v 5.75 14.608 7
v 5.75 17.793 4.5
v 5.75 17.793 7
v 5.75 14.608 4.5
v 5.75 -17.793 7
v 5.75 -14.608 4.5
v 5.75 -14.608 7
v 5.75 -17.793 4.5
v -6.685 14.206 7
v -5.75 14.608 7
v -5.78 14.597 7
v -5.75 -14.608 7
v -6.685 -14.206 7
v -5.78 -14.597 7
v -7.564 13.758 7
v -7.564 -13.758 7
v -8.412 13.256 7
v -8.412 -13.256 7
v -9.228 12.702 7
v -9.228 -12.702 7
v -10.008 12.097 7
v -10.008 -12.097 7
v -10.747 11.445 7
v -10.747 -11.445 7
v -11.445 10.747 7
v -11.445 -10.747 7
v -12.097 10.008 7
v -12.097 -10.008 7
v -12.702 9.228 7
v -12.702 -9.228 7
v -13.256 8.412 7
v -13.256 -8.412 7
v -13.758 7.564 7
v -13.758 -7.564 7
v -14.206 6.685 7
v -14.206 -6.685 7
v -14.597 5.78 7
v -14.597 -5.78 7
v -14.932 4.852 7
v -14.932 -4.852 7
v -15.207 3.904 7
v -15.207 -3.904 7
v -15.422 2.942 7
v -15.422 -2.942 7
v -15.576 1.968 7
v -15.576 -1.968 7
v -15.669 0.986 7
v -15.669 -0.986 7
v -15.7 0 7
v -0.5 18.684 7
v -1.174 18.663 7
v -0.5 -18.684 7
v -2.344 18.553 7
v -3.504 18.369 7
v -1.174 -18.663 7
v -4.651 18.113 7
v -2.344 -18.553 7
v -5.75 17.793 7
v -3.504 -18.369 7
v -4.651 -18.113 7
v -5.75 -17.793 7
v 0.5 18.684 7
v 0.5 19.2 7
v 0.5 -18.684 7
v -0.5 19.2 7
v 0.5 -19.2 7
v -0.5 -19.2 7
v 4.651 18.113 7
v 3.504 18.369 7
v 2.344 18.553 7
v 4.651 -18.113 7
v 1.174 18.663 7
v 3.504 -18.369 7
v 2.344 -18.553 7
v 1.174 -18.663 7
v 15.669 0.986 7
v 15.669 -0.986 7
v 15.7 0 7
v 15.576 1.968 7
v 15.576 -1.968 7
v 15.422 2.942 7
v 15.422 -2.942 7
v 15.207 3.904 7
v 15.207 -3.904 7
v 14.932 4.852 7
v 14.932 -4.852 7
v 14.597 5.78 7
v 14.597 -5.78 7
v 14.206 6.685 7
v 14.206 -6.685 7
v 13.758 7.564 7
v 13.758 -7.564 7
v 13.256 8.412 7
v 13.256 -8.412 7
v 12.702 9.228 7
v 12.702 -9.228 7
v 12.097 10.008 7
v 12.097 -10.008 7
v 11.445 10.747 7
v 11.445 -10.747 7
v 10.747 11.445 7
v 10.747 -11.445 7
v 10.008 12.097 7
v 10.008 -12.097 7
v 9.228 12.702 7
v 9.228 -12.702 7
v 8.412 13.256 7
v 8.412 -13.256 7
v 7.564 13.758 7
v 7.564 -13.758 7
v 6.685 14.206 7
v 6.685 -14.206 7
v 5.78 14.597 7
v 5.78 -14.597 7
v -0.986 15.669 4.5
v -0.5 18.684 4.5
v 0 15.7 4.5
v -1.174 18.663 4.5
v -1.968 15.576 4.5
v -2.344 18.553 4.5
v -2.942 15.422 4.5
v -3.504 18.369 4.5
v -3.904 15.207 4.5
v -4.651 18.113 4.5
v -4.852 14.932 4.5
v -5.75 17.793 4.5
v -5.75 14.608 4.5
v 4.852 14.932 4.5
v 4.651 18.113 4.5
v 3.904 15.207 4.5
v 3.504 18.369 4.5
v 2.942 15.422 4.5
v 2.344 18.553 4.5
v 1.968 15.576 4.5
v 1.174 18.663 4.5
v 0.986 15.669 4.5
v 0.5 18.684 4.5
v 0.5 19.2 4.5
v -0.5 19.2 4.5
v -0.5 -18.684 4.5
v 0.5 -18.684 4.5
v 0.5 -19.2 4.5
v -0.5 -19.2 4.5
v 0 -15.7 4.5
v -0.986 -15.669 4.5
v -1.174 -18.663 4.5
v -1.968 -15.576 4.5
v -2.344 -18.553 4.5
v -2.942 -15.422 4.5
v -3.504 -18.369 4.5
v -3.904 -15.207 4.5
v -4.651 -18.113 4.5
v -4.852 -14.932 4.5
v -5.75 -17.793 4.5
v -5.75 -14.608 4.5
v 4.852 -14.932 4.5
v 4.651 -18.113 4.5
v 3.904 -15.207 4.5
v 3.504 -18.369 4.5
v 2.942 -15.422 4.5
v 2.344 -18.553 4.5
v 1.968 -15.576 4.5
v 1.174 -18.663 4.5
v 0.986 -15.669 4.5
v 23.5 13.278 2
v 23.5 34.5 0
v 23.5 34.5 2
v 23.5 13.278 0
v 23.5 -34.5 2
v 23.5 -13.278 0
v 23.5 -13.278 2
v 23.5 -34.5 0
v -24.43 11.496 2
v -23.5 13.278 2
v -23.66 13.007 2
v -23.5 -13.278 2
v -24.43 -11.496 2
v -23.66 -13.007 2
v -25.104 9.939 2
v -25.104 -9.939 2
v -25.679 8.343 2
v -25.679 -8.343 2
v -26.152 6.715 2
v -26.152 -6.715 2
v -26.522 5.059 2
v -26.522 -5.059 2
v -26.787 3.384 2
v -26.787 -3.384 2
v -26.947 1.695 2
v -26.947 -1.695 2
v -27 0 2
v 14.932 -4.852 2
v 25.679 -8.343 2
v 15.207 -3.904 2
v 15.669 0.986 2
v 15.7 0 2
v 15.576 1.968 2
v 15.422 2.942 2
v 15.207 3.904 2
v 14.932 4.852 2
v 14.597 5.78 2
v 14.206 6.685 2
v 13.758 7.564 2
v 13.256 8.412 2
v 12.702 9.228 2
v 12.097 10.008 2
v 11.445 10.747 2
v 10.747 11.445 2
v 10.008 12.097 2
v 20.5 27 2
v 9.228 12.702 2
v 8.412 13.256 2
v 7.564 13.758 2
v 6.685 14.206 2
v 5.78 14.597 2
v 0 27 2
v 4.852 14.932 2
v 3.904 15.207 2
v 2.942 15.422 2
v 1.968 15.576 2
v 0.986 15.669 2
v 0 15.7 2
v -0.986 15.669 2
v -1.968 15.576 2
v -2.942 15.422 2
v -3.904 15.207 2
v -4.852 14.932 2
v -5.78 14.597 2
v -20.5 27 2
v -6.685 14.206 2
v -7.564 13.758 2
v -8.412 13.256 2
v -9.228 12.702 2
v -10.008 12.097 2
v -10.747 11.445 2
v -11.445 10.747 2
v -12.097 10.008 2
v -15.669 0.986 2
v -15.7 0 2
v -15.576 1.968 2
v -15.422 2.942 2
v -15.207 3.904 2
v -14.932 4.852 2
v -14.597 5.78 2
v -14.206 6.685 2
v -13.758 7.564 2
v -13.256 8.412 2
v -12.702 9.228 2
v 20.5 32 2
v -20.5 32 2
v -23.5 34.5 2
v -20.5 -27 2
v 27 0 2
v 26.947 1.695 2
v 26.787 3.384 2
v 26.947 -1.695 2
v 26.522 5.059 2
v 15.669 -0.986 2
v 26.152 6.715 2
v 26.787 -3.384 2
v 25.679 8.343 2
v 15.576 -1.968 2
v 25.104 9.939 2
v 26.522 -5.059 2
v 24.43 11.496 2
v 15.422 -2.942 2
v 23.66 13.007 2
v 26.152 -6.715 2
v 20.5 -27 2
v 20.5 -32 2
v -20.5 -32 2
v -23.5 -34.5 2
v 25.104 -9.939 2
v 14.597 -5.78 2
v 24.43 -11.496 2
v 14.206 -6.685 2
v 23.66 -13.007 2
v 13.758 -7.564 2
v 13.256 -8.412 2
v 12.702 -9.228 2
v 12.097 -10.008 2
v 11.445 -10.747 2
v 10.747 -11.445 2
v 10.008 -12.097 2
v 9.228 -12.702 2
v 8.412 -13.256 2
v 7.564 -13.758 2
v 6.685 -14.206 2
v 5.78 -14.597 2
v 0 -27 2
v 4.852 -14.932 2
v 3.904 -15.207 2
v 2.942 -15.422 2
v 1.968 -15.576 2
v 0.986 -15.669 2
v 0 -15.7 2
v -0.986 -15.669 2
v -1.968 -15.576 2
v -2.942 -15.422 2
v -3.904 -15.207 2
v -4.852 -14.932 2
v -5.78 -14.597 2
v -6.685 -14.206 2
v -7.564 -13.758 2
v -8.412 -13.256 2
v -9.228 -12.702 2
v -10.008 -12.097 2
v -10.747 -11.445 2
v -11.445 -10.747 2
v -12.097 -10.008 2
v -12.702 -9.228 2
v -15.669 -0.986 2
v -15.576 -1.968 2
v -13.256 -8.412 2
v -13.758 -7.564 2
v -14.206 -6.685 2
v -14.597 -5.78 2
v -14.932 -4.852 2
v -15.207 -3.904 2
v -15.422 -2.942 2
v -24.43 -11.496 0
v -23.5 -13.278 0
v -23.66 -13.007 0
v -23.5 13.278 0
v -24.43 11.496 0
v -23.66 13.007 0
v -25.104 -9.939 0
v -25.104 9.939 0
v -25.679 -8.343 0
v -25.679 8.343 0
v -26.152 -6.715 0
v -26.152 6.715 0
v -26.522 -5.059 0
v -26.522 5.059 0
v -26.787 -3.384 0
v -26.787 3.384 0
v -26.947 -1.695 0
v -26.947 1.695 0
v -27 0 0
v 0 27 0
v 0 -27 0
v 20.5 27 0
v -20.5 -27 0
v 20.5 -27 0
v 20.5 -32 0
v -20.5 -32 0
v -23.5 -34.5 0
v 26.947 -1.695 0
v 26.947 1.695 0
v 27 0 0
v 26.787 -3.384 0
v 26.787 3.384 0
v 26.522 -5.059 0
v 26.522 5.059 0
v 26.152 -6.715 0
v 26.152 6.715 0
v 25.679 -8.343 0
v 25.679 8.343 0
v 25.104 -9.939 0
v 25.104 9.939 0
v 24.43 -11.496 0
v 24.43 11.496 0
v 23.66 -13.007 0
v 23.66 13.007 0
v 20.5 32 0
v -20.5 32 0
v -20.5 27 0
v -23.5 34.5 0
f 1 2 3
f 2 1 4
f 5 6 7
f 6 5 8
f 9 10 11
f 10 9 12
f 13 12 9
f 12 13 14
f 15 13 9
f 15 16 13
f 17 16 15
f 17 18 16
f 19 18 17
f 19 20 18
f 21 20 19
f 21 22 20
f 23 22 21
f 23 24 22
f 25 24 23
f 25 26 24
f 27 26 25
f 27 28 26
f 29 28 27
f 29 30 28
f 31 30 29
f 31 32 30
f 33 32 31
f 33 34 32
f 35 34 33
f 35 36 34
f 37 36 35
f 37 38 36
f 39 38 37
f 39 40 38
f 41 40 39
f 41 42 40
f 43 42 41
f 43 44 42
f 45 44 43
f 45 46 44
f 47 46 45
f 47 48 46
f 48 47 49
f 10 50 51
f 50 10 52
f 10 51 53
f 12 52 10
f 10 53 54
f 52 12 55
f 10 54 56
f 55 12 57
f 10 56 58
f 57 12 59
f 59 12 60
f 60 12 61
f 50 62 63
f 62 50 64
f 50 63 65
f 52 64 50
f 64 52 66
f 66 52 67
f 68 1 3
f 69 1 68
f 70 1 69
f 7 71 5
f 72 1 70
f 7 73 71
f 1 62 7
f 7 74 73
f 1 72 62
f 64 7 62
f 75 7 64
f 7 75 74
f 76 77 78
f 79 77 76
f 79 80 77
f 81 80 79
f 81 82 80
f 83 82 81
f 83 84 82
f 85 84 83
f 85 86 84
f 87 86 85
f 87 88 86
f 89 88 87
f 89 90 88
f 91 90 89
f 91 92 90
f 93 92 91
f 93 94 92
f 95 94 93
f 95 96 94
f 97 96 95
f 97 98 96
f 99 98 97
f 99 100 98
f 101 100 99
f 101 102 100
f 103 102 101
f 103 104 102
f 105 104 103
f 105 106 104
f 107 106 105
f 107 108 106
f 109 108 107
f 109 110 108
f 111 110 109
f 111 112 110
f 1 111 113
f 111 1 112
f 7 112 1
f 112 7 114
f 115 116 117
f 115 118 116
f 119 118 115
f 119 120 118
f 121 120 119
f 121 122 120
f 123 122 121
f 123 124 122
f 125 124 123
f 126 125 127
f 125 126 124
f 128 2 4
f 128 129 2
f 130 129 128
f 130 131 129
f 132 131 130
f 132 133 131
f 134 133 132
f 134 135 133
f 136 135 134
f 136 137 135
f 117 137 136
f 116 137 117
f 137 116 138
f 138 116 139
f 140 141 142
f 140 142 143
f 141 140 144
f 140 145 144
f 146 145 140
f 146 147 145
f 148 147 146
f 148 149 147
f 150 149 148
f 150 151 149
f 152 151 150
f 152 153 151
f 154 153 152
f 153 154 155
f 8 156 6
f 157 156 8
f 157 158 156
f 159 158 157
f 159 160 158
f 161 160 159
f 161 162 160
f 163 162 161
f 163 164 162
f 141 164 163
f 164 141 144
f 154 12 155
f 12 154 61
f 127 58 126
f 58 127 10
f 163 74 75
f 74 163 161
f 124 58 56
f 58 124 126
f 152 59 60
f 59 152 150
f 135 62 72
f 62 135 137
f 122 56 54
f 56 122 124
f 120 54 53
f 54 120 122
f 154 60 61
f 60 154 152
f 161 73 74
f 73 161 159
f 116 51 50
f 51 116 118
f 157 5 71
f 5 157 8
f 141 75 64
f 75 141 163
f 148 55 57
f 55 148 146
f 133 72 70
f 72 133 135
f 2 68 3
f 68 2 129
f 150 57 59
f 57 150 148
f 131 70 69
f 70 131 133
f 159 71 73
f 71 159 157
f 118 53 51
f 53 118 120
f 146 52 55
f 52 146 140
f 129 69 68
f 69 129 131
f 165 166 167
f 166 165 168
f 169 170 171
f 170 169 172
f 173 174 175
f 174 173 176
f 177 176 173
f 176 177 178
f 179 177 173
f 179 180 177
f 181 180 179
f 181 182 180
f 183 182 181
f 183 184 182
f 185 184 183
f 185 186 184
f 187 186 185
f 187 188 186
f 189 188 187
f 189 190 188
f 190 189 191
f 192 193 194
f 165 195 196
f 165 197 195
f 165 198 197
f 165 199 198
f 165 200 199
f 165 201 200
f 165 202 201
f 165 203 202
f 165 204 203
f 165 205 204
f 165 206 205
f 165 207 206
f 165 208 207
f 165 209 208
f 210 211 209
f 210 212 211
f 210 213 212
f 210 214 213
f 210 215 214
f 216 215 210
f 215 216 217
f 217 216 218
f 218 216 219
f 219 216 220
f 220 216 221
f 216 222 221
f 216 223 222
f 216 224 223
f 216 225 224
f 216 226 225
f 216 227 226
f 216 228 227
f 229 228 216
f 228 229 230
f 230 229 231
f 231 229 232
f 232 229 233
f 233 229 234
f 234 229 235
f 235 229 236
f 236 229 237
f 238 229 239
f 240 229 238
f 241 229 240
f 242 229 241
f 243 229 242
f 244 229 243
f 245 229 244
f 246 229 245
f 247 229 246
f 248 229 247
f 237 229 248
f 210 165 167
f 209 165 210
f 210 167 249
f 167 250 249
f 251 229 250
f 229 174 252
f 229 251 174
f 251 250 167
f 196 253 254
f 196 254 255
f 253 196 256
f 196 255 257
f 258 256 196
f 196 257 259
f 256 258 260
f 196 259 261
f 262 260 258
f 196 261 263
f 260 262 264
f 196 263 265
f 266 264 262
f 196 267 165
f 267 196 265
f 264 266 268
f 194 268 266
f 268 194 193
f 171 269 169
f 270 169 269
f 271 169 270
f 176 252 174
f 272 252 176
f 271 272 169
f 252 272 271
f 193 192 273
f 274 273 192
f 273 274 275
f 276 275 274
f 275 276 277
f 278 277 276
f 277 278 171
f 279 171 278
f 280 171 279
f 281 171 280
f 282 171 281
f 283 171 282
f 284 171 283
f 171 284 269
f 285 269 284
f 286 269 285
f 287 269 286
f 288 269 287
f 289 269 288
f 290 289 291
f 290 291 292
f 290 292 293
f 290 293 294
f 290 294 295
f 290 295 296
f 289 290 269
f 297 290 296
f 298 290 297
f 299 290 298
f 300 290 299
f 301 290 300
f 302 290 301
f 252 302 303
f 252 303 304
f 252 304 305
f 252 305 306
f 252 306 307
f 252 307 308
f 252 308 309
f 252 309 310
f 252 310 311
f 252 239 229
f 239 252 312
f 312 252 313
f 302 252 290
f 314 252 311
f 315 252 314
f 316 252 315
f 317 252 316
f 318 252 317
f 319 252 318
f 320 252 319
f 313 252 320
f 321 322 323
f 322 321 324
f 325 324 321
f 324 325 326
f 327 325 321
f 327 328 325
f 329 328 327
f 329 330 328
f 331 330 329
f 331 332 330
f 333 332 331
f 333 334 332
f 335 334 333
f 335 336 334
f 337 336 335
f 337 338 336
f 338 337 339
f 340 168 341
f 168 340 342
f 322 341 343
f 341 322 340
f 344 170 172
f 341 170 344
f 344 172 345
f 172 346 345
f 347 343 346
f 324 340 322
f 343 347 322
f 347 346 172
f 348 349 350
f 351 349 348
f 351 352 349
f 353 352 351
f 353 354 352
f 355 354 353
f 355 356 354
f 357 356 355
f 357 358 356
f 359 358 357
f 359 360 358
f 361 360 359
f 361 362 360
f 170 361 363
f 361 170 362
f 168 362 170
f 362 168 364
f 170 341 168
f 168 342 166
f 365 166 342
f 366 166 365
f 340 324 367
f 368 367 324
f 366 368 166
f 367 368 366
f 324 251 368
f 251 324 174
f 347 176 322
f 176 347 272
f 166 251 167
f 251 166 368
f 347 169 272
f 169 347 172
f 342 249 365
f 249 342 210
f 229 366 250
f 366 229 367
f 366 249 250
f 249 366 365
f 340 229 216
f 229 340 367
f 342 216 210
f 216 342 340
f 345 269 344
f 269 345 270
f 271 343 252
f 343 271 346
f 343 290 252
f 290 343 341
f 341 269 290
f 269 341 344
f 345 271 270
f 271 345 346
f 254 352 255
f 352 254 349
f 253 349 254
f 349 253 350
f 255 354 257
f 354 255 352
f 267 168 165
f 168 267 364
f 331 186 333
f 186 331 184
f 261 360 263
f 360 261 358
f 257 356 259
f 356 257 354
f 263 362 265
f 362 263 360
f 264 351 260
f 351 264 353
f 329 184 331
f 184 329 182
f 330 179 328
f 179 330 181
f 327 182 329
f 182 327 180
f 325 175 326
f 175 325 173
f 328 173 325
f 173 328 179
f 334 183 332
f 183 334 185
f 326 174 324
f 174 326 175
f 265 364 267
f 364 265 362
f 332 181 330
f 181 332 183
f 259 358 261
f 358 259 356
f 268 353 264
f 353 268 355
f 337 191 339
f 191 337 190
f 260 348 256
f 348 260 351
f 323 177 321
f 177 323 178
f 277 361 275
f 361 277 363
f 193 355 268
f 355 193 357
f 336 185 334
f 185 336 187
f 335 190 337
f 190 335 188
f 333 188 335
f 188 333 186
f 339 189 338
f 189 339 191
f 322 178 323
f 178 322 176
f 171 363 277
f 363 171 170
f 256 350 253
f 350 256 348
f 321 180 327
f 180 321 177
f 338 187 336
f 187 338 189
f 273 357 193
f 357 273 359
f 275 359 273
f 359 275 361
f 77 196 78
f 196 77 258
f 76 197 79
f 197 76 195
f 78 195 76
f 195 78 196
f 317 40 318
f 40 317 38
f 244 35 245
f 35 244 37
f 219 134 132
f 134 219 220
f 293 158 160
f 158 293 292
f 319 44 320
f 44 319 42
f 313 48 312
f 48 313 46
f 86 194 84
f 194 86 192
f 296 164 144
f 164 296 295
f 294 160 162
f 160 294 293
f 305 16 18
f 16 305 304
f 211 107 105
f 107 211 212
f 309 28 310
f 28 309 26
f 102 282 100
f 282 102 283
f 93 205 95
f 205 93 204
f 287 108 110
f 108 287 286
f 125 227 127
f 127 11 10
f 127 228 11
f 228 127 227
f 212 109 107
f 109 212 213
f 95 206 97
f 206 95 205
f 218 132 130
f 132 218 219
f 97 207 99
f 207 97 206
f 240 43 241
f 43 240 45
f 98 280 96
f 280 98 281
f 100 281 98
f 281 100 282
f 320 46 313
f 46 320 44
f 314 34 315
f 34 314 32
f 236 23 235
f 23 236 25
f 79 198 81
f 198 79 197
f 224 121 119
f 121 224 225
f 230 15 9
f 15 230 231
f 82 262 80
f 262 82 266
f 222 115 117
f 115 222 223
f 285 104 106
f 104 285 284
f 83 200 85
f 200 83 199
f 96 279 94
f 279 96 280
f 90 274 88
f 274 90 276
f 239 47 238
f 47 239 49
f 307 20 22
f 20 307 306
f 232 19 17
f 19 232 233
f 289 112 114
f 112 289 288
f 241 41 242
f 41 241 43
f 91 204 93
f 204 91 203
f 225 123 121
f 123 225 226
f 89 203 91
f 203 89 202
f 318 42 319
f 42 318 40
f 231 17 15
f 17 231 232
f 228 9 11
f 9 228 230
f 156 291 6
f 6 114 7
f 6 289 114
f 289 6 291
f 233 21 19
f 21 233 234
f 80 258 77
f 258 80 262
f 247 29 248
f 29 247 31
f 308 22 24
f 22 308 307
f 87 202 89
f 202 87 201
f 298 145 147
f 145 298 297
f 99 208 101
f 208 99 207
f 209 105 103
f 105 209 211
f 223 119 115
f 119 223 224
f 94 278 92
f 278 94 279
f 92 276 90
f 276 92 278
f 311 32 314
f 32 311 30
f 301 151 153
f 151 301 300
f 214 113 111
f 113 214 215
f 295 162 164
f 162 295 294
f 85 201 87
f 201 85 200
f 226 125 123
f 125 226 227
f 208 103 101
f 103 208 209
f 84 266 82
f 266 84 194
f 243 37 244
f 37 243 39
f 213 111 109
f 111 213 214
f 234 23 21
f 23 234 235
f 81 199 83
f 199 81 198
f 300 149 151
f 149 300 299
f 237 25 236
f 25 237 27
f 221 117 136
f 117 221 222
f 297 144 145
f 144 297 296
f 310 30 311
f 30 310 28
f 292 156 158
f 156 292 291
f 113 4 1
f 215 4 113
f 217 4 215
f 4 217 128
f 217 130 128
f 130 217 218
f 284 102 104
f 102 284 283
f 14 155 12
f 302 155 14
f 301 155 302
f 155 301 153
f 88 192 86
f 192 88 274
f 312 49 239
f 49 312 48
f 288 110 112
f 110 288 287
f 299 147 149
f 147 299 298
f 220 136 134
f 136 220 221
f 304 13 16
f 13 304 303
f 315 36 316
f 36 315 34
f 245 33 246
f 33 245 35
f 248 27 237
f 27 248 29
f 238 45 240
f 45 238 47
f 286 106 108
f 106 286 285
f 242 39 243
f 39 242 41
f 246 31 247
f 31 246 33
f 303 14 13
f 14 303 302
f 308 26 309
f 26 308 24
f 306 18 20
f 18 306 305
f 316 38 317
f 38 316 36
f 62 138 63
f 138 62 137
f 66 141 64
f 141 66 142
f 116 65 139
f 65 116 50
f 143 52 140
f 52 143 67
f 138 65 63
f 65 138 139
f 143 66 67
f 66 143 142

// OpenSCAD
$fn=100;
brad=54/2;
trad=31.4/2;
gap=2.5;

cylinder(r=brad,h=2);
cylinder(r=trad,h=2+gap+2.5);
intersection(){
   translate([0,0,2+gap+1.25]) cube([11.5,trad*2+6,2.5], center=true);
   cylinder(r=trad+3,h=2+gap+2.5);
}
   translate([0,0,2+gap+1.25]) cube([1,trad*2+6+1,2.5], center=true);

difference() {
translate([0,0,1]) cube([47,brad*2+15,2], center=true);
translate([-20.5,brad,-1]) cube([41,5,4]);
translate([-20.5,-brad-5,-1]) cube([41,5,4]);
}
